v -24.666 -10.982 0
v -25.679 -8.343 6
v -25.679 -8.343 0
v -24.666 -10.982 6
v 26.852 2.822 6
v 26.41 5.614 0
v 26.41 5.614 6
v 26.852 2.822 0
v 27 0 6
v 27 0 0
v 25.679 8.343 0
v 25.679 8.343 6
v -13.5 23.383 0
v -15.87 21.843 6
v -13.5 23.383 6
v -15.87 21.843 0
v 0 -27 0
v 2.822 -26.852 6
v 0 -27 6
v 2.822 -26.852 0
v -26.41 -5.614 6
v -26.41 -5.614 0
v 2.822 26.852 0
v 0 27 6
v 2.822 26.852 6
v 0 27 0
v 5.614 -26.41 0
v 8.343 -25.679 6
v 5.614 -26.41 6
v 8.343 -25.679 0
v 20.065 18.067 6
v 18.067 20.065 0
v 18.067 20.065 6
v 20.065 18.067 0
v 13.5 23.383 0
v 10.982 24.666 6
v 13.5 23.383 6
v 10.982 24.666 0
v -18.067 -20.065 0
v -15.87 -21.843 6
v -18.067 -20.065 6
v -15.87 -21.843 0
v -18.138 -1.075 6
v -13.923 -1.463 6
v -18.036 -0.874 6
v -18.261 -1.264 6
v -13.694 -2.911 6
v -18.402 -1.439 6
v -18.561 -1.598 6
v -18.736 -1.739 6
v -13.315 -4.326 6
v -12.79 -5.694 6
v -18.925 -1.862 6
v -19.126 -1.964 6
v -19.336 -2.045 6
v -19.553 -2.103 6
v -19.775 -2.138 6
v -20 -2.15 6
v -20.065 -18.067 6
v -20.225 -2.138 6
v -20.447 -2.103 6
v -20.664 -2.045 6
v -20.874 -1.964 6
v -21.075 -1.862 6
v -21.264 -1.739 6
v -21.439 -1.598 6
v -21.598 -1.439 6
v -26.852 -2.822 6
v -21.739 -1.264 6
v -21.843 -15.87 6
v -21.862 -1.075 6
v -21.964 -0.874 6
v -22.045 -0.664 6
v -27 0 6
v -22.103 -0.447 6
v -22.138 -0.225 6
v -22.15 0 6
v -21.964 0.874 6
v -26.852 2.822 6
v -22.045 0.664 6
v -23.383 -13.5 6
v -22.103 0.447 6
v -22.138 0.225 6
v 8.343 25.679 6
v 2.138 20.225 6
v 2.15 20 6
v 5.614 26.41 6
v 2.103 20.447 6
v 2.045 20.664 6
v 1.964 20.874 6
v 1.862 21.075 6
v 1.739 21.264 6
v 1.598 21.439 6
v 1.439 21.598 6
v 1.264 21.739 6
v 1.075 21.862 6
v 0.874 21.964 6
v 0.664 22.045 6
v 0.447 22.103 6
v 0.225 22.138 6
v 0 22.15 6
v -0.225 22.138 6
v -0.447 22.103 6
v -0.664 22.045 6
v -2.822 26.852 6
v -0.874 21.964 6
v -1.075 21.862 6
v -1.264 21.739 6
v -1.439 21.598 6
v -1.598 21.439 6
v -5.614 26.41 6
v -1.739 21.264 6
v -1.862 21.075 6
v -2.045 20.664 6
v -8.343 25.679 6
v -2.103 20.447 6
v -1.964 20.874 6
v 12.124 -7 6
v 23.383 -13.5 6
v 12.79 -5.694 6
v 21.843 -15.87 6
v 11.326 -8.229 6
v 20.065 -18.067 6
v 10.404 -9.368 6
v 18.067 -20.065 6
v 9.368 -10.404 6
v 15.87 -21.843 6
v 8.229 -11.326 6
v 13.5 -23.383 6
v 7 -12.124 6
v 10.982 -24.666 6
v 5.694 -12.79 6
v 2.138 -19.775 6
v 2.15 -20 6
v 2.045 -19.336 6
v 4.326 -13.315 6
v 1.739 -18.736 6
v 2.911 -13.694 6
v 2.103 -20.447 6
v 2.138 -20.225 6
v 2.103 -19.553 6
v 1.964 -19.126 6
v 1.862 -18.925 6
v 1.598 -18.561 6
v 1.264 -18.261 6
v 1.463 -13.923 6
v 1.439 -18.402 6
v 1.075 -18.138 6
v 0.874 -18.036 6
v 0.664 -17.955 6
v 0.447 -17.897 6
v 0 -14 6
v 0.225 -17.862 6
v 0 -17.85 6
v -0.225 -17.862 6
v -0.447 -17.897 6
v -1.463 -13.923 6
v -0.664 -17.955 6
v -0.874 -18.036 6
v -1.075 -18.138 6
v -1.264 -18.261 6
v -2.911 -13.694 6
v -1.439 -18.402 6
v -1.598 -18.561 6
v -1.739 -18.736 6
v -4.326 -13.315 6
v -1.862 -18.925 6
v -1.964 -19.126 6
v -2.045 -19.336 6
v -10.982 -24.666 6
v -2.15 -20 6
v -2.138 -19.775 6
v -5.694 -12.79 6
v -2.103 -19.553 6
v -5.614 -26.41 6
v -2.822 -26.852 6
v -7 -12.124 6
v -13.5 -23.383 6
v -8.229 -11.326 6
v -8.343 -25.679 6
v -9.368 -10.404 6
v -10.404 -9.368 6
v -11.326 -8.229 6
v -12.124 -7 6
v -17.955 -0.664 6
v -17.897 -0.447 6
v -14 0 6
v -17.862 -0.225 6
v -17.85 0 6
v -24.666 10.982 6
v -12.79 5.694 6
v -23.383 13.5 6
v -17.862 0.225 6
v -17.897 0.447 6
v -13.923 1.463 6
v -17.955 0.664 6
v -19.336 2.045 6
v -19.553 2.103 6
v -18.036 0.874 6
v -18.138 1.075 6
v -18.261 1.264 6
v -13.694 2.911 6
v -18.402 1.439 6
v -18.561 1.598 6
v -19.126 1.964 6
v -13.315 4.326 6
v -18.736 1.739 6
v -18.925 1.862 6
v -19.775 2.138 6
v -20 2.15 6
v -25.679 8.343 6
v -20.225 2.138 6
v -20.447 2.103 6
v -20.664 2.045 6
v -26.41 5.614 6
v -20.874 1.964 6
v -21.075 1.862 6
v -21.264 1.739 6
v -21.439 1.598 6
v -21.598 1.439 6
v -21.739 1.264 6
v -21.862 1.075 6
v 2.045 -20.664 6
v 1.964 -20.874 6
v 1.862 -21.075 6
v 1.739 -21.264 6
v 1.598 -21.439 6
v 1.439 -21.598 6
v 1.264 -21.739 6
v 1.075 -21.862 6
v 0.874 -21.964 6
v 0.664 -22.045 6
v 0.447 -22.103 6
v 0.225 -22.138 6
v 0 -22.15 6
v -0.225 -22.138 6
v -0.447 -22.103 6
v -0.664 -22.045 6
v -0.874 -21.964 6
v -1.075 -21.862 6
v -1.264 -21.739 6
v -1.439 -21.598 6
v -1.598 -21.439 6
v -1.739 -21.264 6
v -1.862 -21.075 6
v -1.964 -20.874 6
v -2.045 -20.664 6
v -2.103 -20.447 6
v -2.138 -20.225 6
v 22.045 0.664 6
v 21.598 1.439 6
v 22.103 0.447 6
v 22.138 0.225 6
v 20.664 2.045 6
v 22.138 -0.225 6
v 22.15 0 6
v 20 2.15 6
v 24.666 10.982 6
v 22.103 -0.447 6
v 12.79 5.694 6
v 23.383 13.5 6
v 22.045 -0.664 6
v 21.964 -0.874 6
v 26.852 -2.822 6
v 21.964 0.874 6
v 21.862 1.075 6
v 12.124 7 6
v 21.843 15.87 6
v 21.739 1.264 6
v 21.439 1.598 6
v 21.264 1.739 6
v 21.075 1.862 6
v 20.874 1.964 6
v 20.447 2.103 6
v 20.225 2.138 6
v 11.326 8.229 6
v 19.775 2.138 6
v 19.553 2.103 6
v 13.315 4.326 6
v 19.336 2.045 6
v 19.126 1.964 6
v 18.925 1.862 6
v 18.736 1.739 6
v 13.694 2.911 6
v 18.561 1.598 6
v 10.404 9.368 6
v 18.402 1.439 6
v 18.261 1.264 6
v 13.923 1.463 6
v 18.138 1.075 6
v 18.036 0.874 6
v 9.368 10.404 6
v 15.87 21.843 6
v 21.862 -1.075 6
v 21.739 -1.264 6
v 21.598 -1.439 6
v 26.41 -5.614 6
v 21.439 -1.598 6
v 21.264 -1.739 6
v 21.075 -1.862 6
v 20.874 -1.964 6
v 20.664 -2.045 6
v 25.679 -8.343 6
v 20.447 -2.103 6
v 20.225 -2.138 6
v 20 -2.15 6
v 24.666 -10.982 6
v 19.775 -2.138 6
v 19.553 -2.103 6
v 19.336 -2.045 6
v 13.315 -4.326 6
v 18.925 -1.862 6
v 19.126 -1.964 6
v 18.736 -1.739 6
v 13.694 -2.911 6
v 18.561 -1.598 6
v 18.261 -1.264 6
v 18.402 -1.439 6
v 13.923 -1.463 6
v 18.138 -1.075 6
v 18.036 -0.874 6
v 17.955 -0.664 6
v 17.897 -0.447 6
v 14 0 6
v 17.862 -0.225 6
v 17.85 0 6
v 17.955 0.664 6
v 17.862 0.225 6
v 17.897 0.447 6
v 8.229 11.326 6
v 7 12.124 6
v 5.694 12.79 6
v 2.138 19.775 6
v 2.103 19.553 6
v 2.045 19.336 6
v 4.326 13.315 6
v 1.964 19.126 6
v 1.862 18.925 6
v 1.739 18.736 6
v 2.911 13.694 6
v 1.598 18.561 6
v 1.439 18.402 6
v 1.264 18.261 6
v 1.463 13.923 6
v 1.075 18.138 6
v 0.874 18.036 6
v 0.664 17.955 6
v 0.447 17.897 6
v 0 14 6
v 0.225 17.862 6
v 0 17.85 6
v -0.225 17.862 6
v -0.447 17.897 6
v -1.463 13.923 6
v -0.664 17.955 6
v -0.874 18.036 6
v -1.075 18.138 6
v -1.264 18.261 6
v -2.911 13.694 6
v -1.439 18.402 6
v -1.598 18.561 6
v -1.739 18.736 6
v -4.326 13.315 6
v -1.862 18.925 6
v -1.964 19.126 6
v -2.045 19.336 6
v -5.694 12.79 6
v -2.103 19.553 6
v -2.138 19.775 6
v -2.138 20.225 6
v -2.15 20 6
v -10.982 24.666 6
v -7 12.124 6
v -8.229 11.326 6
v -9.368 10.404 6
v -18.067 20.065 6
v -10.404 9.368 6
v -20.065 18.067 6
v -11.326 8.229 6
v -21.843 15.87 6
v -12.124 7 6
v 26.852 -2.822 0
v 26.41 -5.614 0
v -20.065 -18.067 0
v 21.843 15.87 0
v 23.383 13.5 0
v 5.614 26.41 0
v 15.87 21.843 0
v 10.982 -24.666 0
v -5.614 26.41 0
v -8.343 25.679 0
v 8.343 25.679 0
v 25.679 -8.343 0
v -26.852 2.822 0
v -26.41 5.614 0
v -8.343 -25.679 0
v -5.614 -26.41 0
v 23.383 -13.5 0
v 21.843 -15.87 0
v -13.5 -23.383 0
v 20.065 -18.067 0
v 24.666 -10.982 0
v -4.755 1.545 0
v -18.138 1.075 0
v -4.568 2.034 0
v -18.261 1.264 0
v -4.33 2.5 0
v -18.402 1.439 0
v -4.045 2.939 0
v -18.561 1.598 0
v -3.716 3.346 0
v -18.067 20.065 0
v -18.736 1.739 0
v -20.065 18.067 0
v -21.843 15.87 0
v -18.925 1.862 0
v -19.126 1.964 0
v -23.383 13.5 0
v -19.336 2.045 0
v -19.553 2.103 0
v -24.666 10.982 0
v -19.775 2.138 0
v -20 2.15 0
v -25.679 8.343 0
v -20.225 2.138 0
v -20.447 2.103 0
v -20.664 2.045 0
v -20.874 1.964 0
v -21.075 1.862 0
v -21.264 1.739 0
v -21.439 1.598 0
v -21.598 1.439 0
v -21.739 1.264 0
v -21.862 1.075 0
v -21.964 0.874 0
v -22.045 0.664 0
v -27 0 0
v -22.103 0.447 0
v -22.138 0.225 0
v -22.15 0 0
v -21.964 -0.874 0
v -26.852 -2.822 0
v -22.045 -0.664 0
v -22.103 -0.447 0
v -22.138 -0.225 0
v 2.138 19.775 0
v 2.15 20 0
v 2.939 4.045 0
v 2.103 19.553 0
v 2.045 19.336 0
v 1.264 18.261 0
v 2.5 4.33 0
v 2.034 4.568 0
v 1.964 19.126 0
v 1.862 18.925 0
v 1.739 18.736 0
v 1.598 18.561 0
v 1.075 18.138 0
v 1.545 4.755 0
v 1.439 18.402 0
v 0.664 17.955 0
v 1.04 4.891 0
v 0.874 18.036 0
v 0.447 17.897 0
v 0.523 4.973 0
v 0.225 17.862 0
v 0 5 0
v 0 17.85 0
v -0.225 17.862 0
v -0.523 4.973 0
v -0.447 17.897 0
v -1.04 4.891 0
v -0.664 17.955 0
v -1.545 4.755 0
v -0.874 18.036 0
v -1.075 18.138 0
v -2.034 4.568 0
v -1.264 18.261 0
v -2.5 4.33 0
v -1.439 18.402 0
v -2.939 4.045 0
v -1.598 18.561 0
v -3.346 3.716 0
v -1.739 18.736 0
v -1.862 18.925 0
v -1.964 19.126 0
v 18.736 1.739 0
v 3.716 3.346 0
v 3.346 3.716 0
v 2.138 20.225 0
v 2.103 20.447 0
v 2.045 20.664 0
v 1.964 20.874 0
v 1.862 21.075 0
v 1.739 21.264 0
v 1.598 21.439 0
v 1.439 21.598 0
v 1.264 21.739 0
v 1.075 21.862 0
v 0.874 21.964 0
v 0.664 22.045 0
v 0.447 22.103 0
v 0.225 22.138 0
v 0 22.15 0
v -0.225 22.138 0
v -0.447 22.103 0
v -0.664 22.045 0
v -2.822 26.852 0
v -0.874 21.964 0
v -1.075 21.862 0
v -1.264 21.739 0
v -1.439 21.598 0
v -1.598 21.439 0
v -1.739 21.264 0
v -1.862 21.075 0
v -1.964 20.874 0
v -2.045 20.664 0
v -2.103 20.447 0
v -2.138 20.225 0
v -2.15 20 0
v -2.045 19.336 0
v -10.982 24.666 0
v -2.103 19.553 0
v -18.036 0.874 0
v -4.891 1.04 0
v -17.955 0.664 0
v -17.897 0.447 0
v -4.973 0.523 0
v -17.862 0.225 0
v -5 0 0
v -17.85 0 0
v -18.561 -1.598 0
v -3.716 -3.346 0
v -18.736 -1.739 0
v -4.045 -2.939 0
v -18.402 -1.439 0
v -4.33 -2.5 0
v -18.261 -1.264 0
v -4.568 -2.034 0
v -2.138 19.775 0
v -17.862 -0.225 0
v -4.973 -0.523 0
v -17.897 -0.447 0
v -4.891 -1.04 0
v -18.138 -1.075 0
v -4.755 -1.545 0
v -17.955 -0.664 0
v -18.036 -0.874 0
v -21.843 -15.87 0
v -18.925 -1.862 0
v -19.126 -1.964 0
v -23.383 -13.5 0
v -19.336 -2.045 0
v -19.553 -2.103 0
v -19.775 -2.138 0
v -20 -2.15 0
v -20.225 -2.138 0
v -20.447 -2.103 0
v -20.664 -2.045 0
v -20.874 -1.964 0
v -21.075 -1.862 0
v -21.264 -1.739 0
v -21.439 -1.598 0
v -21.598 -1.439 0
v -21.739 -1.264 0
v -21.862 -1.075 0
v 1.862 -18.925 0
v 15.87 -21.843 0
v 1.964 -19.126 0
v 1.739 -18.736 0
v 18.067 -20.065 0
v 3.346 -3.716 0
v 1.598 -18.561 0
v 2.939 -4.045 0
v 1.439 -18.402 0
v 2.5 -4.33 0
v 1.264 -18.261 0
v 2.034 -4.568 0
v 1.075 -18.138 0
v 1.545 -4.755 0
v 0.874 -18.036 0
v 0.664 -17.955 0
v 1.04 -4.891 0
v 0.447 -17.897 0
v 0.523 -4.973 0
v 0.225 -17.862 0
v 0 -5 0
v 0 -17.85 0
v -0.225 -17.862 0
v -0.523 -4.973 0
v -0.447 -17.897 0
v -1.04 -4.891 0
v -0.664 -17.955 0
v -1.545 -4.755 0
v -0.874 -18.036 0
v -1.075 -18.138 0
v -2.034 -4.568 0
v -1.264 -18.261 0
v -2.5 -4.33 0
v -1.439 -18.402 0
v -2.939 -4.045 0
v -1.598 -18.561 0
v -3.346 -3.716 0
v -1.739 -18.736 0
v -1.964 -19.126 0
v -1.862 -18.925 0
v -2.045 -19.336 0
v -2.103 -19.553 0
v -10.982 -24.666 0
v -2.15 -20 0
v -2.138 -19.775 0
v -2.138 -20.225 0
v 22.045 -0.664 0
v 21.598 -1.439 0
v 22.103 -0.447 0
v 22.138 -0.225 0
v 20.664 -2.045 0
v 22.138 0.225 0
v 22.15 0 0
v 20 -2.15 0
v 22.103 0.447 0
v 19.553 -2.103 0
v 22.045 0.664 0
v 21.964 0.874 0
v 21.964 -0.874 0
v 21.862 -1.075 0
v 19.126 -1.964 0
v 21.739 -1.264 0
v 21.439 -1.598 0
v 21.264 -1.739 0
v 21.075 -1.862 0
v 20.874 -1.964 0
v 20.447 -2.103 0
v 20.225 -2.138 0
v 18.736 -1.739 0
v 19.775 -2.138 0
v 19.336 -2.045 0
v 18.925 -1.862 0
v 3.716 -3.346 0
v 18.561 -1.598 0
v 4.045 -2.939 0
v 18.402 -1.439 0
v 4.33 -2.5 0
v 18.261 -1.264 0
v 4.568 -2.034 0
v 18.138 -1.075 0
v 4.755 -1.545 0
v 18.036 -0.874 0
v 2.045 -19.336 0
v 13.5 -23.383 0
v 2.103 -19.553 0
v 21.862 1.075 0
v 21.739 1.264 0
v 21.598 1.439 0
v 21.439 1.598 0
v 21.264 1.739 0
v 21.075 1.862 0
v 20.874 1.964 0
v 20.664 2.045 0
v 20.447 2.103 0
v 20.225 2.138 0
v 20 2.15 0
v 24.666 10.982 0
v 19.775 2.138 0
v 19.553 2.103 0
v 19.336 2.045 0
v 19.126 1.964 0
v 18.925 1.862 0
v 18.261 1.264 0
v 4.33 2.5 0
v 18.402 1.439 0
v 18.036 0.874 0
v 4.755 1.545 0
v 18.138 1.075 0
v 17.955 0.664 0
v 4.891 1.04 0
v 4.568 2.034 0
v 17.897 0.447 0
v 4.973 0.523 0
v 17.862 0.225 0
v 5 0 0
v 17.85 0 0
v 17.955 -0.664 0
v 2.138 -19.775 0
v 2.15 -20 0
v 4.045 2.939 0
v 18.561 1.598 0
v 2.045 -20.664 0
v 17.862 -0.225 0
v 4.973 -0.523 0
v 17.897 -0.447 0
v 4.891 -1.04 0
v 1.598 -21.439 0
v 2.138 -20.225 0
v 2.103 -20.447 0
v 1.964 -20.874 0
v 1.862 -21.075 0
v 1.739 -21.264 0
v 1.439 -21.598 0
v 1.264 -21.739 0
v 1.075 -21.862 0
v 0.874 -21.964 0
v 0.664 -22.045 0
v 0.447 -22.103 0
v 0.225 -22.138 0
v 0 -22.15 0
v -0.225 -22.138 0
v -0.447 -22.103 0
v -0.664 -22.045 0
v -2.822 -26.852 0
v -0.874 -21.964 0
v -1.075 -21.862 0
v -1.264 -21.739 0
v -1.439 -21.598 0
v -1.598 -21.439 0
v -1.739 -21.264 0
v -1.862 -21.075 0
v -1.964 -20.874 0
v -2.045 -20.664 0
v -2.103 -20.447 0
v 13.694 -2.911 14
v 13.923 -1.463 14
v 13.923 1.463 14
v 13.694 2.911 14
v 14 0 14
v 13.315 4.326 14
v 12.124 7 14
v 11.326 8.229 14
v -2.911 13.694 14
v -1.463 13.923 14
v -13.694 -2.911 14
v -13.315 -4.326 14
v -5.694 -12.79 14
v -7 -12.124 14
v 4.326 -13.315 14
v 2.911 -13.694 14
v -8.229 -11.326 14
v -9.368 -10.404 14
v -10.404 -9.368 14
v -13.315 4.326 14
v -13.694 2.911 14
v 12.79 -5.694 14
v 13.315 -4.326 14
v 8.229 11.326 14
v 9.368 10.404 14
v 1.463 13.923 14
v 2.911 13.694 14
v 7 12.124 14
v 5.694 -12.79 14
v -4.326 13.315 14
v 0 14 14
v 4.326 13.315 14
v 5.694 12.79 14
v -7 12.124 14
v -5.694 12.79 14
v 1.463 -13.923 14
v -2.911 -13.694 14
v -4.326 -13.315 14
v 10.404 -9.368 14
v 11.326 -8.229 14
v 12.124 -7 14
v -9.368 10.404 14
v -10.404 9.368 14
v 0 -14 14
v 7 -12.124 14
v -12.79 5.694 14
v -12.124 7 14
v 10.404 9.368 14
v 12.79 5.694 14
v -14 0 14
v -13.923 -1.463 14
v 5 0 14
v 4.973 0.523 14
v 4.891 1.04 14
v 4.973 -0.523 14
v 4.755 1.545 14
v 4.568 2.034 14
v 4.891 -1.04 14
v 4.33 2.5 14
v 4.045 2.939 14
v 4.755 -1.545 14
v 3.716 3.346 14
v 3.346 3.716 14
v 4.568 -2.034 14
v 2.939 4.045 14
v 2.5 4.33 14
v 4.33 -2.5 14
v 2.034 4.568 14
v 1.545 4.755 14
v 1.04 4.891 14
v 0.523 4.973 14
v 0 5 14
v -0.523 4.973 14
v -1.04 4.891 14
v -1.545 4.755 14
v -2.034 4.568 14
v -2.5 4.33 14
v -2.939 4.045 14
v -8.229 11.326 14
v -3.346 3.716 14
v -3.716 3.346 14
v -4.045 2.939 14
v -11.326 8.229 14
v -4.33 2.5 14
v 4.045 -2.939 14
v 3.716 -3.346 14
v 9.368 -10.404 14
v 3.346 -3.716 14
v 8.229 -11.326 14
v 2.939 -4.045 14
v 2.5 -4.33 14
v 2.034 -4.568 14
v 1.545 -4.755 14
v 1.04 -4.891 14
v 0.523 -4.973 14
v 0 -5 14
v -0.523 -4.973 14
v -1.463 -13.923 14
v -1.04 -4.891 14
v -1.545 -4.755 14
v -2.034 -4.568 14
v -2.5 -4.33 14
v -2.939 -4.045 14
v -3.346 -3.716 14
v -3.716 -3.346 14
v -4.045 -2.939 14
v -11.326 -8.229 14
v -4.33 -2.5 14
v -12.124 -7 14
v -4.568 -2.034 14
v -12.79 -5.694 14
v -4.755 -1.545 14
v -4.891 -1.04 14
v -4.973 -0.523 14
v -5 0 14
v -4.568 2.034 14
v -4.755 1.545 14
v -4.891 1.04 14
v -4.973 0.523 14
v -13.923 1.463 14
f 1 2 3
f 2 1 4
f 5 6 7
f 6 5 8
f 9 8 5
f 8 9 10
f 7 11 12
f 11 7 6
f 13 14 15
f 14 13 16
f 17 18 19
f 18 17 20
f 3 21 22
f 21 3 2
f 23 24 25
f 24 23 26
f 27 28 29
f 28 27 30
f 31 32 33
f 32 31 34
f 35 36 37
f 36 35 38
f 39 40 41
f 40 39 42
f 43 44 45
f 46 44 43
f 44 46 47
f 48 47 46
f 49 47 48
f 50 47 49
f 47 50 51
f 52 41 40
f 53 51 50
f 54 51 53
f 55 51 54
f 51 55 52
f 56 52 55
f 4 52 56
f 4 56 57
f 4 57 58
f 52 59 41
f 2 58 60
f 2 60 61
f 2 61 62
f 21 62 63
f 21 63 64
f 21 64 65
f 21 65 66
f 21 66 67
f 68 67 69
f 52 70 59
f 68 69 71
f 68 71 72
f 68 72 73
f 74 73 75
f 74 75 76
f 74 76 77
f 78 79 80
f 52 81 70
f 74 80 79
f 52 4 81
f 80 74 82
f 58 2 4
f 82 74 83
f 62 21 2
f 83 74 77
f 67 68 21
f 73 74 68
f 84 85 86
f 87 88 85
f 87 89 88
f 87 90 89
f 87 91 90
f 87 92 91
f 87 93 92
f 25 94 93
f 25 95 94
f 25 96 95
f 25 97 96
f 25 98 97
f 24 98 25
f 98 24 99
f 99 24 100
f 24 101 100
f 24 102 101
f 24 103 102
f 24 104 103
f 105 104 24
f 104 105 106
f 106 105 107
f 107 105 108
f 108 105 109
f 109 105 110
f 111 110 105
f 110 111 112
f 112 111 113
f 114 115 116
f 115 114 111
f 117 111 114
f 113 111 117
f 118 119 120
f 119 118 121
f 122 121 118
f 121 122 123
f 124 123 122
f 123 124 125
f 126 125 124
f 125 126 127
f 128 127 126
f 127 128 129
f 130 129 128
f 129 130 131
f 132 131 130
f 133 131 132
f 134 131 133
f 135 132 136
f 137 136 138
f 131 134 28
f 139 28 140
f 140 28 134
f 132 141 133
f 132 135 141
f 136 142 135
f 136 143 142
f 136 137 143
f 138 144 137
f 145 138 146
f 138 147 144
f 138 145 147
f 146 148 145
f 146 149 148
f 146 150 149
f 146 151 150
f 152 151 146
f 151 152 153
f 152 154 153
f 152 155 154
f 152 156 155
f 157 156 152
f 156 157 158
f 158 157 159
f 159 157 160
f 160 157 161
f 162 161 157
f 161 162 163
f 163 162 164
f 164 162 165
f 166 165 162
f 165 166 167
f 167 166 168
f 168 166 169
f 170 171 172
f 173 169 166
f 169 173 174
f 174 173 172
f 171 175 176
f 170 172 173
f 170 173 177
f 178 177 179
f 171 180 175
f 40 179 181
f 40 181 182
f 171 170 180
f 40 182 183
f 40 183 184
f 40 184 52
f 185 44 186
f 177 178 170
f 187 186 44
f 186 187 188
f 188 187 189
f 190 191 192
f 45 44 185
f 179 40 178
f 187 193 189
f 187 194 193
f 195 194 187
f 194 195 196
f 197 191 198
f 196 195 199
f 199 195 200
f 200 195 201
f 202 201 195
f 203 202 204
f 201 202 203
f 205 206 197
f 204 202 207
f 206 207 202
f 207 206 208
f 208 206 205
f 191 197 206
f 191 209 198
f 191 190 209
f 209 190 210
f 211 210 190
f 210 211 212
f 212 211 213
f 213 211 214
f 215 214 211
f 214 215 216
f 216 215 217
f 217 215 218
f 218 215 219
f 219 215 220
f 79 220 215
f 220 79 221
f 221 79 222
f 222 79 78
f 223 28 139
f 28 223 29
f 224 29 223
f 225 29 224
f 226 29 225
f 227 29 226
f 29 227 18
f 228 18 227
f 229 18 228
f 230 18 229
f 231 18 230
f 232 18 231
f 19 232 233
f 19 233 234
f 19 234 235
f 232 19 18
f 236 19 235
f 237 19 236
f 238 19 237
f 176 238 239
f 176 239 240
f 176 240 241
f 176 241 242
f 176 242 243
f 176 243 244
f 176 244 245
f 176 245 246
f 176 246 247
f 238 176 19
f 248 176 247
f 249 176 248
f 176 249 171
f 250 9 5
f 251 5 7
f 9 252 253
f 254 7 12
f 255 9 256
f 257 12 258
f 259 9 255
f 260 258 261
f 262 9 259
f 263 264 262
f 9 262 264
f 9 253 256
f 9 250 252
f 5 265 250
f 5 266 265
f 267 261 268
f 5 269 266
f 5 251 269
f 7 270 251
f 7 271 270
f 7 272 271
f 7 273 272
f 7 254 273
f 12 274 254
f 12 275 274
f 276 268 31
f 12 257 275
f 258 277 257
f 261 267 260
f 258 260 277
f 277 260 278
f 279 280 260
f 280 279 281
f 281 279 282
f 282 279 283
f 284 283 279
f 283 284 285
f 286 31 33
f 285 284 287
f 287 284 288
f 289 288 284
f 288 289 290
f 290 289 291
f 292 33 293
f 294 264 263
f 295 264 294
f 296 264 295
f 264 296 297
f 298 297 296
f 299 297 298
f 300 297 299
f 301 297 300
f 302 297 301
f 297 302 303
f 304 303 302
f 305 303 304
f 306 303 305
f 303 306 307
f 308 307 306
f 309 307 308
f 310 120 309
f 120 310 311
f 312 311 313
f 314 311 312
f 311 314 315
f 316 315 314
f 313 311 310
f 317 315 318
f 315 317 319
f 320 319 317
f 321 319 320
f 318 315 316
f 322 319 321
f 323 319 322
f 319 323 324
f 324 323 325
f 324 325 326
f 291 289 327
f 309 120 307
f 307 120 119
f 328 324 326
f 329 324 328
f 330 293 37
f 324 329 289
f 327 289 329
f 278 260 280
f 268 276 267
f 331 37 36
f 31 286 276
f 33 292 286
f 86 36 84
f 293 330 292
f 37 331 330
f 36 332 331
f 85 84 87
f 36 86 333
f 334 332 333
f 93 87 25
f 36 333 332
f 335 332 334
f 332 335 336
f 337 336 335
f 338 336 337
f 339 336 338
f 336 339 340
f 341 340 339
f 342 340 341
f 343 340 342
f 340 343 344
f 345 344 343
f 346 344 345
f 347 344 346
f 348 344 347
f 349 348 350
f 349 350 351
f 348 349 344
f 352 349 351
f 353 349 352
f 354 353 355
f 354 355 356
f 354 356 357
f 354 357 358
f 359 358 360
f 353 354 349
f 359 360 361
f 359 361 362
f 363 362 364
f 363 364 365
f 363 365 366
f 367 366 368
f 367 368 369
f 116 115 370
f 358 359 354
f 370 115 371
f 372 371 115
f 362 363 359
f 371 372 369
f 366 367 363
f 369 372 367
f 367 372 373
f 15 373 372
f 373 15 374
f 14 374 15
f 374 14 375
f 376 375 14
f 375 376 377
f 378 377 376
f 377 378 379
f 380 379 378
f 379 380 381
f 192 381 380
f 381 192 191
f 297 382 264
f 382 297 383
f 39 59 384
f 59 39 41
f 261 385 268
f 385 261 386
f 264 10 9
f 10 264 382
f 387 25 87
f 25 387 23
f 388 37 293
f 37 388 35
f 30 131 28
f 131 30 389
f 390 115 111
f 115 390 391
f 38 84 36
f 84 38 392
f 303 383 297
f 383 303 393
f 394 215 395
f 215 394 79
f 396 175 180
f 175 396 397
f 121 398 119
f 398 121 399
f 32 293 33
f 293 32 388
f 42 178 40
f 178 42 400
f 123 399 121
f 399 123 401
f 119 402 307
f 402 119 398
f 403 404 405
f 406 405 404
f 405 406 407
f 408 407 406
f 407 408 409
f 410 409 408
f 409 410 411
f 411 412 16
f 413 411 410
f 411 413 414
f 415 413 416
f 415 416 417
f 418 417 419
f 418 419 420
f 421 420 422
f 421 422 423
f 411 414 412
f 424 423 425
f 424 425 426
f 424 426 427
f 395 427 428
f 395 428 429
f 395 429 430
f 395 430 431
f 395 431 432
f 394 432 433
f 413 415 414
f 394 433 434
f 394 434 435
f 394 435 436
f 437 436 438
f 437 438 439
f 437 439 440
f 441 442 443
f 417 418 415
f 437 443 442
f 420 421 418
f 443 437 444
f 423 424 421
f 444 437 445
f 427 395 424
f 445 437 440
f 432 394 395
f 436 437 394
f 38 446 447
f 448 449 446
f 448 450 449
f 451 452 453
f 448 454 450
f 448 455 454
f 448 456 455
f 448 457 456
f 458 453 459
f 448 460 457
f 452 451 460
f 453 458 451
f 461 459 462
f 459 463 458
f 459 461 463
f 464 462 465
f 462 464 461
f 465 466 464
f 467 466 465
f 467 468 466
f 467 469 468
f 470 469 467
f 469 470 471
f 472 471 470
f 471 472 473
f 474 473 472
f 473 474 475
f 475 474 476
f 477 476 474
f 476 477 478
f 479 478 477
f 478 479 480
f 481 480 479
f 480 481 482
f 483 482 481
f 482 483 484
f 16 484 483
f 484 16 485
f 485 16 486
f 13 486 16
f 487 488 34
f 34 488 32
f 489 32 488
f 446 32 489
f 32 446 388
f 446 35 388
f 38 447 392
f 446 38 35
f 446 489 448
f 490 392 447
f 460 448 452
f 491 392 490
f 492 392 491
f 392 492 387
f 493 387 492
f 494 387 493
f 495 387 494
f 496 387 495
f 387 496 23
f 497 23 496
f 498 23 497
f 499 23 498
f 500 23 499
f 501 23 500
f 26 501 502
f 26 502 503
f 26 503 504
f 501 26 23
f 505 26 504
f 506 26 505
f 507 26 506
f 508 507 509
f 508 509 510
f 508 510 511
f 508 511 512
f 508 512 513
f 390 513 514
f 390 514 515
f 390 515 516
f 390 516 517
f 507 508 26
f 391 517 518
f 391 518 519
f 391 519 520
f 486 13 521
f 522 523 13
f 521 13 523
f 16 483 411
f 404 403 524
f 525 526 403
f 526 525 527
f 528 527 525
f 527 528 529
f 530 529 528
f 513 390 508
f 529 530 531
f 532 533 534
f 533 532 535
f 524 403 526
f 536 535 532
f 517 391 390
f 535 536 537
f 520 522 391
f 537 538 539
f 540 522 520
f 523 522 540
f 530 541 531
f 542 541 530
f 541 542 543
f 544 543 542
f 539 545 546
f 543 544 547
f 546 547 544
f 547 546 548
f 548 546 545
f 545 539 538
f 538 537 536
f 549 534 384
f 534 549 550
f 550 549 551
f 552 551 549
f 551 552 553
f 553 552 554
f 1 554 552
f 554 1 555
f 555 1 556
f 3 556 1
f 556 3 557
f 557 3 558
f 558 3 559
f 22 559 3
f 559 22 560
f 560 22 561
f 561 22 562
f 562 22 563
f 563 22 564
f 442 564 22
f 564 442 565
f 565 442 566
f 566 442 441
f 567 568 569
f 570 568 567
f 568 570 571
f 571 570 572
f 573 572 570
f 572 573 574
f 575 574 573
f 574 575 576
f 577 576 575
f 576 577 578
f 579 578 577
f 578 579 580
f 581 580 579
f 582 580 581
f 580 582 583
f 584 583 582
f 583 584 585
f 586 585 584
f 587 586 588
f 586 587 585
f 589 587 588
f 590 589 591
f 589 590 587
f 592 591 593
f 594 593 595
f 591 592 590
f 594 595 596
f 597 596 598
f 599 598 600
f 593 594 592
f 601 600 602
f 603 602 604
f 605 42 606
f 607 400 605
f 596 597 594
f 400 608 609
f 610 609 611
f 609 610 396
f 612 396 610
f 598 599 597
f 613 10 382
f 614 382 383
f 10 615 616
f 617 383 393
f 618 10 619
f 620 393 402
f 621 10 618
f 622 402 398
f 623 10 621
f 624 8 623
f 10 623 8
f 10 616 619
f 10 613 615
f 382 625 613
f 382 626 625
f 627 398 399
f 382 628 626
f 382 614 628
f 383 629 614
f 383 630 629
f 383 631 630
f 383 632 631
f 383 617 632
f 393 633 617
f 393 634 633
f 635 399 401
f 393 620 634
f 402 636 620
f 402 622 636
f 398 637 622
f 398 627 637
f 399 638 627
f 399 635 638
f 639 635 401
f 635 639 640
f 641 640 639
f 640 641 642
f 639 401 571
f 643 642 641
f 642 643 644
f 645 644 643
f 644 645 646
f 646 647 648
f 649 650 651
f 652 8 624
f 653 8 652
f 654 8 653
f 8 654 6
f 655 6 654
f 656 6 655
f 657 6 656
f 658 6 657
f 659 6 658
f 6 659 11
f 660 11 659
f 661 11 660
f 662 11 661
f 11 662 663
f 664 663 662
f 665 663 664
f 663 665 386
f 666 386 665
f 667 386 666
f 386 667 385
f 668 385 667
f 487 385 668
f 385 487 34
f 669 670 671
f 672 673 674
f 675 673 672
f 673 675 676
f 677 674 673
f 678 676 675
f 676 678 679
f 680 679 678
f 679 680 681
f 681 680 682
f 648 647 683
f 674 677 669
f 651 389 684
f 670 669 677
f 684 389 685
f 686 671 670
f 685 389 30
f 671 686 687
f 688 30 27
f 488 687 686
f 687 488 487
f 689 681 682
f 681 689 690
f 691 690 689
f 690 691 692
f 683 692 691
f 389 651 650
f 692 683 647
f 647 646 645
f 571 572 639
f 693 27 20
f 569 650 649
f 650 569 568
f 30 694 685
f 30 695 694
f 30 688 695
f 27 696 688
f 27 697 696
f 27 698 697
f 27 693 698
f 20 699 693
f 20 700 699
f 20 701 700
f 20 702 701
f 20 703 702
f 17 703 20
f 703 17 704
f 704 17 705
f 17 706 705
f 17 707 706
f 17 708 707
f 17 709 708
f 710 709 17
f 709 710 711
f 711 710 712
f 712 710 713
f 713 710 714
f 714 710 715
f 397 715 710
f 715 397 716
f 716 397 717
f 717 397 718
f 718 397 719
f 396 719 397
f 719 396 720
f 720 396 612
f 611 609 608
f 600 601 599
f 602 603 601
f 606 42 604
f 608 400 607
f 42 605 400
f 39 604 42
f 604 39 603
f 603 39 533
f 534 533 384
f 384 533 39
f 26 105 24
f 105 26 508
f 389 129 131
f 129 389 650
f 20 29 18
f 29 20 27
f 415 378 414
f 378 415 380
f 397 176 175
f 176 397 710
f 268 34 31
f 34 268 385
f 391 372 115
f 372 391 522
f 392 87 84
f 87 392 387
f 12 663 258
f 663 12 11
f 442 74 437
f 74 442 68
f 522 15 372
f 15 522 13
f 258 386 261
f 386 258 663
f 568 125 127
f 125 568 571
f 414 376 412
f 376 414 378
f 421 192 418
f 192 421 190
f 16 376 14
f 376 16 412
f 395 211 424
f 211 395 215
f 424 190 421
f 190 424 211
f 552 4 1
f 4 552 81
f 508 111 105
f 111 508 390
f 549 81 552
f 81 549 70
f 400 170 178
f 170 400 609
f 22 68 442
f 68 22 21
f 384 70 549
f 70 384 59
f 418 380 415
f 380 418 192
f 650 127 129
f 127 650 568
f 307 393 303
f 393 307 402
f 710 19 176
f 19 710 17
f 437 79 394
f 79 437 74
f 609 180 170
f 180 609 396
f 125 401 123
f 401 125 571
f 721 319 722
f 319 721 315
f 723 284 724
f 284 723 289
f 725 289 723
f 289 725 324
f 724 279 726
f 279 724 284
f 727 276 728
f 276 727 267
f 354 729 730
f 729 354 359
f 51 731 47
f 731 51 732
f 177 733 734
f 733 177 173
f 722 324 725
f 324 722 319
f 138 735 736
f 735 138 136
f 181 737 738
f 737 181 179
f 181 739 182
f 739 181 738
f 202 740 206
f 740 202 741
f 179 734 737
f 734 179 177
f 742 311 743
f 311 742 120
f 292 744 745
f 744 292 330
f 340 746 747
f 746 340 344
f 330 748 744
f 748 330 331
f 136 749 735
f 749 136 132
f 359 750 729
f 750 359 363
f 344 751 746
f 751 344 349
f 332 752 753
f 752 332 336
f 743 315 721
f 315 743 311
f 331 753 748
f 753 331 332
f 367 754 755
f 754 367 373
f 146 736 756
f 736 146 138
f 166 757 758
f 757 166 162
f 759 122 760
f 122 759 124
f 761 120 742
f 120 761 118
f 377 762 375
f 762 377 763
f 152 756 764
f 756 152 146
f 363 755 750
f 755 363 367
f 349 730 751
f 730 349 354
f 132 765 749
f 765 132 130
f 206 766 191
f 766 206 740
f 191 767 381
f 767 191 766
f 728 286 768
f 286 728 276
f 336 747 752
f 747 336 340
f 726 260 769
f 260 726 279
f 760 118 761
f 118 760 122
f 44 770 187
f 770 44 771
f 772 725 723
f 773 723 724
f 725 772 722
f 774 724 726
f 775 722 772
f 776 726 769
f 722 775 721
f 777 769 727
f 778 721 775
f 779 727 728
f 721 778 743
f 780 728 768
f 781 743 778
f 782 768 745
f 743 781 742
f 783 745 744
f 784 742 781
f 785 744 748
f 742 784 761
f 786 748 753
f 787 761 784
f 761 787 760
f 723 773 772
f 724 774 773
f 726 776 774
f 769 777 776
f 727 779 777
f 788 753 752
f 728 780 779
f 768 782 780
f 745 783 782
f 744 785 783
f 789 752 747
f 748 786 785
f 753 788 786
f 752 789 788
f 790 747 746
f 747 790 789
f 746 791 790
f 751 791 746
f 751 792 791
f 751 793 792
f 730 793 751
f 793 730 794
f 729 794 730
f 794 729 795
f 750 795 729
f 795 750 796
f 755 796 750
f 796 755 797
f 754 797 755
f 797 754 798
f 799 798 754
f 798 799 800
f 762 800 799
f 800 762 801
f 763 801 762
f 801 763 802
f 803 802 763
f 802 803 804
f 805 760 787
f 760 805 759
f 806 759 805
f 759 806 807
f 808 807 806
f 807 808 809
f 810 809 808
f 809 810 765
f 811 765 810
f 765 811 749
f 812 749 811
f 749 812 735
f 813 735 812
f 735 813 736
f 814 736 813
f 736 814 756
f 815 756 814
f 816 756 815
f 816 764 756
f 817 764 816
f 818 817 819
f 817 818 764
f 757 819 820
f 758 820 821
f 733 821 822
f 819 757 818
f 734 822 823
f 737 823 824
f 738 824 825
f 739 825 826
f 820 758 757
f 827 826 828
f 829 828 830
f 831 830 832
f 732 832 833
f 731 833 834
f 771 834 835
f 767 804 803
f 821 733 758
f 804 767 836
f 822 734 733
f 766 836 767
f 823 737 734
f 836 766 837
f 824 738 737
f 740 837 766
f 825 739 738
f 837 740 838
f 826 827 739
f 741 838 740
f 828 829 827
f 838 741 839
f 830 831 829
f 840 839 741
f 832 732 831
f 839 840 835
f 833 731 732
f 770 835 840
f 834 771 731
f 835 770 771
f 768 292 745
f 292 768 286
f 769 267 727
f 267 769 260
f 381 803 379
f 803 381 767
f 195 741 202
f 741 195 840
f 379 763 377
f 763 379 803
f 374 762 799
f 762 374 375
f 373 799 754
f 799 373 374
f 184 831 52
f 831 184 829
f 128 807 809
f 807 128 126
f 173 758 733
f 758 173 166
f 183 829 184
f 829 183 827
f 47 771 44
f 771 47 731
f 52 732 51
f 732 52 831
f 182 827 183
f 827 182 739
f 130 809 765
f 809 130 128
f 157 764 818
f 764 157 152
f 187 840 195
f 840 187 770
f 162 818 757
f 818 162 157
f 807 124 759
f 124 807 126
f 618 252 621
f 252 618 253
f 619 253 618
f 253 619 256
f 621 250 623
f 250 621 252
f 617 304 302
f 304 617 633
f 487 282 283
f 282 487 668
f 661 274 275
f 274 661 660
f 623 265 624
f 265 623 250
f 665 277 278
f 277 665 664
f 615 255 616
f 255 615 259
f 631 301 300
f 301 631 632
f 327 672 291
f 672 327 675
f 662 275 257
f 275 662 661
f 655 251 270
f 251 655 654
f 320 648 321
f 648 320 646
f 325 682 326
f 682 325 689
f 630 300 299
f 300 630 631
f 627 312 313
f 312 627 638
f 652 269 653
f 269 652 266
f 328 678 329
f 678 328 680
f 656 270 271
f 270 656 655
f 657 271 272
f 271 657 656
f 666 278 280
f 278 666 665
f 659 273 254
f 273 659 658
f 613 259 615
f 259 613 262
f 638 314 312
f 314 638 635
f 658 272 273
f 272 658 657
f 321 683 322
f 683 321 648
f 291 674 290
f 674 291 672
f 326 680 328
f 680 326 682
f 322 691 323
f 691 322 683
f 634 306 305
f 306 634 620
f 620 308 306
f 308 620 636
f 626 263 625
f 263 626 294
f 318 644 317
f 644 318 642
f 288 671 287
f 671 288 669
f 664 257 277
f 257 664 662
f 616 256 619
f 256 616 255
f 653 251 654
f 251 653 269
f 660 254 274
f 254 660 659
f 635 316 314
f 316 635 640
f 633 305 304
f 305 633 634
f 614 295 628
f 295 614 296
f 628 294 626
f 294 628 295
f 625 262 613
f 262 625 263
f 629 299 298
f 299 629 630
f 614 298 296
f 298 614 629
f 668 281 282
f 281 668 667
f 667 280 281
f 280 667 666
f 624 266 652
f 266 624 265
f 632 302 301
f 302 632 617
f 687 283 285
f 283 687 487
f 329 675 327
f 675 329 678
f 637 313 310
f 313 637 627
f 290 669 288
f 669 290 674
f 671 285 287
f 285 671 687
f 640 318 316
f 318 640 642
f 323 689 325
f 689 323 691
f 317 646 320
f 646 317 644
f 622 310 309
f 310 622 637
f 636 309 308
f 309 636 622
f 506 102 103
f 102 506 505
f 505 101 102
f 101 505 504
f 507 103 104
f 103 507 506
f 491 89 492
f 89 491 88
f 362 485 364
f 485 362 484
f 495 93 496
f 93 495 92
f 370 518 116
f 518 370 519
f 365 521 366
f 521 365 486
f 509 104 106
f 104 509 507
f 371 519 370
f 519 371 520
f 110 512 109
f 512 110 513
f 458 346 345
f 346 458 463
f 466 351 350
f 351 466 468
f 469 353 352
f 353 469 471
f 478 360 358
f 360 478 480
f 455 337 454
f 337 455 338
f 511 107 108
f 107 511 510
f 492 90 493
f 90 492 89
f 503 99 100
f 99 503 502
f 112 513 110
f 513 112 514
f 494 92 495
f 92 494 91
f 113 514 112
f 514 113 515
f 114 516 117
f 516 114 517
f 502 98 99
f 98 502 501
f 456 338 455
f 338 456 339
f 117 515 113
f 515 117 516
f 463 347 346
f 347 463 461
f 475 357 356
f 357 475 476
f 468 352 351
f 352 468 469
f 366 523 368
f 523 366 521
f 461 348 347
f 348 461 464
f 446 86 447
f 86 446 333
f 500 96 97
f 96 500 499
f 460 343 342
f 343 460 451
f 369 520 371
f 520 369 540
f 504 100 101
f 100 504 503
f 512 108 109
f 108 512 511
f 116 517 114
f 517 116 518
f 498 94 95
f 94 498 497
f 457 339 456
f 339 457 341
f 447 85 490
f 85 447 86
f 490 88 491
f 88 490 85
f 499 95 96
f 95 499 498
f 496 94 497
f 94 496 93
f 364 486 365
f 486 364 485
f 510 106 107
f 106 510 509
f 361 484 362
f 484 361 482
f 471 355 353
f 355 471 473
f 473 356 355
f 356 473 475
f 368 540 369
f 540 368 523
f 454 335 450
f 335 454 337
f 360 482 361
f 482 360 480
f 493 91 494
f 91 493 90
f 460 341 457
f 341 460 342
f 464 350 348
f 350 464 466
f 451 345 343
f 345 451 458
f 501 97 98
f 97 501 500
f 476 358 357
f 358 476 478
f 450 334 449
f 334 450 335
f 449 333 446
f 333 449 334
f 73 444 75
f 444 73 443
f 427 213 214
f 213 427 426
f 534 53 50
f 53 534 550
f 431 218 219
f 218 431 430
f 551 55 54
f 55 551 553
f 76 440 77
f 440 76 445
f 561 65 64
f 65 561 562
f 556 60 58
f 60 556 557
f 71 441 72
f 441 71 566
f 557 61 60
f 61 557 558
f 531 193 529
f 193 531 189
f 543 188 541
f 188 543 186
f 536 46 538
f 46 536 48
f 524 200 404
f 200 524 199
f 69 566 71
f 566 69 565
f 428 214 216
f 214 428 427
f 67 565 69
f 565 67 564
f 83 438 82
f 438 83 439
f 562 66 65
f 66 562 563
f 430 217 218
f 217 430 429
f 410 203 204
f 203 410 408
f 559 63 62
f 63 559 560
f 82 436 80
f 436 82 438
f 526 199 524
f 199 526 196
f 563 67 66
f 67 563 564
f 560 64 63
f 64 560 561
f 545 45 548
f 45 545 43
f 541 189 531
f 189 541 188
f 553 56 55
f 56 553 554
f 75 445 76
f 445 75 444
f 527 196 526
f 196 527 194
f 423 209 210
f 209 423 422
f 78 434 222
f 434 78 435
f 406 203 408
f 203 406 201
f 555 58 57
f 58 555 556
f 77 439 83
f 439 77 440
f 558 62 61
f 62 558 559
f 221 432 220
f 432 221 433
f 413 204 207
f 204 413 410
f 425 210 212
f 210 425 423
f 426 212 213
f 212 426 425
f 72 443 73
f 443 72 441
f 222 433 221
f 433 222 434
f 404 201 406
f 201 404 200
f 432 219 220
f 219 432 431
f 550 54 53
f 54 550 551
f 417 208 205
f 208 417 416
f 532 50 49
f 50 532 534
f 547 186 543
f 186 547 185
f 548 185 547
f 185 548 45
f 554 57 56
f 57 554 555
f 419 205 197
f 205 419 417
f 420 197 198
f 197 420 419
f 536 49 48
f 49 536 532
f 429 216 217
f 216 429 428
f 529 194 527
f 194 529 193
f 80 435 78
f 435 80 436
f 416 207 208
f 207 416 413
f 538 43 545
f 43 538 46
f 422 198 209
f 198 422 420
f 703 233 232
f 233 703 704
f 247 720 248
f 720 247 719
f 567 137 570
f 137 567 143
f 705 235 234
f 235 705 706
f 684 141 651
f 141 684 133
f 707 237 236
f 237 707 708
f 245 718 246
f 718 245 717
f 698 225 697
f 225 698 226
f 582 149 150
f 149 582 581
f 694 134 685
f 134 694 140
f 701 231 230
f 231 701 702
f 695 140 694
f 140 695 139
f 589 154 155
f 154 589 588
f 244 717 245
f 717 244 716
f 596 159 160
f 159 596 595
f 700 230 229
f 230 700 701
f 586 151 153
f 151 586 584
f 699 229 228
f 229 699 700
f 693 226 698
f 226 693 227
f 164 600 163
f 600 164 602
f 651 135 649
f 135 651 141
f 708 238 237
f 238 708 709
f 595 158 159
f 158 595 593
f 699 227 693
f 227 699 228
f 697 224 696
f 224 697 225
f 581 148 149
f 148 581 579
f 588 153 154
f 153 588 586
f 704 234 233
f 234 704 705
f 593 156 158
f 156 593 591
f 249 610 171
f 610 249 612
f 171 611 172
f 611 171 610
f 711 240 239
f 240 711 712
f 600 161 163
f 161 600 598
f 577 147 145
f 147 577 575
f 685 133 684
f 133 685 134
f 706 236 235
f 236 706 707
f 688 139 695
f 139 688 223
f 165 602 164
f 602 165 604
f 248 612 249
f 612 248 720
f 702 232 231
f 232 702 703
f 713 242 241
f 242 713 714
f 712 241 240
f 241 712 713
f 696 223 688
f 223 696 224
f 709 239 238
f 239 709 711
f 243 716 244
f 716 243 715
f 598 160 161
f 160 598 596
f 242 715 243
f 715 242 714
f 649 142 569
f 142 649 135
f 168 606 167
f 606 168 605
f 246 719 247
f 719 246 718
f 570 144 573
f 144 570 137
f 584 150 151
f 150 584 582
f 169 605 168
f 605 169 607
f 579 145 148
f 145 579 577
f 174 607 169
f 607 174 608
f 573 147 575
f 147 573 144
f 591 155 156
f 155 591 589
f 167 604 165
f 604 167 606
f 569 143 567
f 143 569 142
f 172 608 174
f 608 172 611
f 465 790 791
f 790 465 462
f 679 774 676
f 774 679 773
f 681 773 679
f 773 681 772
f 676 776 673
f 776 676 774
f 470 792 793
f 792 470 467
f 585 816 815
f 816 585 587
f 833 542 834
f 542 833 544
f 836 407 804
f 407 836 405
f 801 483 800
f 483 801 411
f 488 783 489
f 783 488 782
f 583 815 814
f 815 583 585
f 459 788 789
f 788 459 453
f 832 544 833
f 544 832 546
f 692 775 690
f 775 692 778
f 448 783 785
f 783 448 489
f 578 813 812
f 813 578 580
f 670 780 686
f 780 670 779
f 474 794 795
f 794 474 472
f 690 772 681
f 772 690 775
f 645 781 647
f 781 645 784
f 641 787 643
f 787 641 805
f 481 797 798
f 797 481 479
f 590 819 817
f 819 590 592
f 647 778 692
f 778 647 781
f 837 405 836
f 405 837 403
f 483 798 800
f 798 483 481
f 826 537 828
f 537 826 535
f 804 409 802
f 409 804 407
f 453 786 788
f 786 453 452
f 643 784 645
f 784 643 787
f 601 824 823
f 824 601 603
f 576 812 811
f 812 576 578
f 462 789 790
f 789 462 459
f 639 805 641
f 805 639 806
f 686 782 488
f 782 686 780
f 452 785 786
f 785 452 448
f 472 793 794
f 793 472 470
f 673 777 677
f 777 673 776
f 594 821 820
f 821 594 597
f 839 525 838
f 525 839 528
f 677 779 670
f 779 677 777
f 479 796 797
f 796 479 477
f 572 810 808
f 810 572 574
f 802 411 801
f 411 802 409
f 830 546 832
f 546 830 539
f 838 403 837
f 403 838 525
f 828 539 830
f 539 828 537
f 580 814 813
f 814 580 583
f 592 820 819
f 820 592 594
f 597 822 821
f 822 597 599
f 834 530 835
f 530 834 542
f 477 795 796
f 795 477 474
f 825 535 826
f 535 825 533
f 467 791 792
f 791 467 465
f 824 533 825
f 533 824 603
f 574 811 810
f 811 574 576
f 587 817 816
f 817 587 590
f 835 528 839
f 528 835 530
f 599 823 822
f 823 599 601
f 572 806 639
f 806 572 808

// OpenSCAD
// 4-bolt mounting flange, 54 mm OD.
$fn = 60;
eps = 0.02;
flange_d = 54;
flange_t = 6;
hub_d = 28;
hub_h = 14;
center_d = 10;
bolt_circle_d = 40;
bolt_d = 4.3;
difference() {
    union() { cylinder(d = flange_d, h = flange_t); cylinder(d = hub_d, h = hub_h); }
    translate([0, 0, -eps]) cylinder(d = center_d, h = hub_h + 2 * eps);
    for (i = [0 : 3]) rotate([0, 0, i * 360 / 4])
        translate([bolt_circle_d / 2, 0, -eps]) cylinder(d = bolt_d, h = flange_t + 2 * eps);
}
